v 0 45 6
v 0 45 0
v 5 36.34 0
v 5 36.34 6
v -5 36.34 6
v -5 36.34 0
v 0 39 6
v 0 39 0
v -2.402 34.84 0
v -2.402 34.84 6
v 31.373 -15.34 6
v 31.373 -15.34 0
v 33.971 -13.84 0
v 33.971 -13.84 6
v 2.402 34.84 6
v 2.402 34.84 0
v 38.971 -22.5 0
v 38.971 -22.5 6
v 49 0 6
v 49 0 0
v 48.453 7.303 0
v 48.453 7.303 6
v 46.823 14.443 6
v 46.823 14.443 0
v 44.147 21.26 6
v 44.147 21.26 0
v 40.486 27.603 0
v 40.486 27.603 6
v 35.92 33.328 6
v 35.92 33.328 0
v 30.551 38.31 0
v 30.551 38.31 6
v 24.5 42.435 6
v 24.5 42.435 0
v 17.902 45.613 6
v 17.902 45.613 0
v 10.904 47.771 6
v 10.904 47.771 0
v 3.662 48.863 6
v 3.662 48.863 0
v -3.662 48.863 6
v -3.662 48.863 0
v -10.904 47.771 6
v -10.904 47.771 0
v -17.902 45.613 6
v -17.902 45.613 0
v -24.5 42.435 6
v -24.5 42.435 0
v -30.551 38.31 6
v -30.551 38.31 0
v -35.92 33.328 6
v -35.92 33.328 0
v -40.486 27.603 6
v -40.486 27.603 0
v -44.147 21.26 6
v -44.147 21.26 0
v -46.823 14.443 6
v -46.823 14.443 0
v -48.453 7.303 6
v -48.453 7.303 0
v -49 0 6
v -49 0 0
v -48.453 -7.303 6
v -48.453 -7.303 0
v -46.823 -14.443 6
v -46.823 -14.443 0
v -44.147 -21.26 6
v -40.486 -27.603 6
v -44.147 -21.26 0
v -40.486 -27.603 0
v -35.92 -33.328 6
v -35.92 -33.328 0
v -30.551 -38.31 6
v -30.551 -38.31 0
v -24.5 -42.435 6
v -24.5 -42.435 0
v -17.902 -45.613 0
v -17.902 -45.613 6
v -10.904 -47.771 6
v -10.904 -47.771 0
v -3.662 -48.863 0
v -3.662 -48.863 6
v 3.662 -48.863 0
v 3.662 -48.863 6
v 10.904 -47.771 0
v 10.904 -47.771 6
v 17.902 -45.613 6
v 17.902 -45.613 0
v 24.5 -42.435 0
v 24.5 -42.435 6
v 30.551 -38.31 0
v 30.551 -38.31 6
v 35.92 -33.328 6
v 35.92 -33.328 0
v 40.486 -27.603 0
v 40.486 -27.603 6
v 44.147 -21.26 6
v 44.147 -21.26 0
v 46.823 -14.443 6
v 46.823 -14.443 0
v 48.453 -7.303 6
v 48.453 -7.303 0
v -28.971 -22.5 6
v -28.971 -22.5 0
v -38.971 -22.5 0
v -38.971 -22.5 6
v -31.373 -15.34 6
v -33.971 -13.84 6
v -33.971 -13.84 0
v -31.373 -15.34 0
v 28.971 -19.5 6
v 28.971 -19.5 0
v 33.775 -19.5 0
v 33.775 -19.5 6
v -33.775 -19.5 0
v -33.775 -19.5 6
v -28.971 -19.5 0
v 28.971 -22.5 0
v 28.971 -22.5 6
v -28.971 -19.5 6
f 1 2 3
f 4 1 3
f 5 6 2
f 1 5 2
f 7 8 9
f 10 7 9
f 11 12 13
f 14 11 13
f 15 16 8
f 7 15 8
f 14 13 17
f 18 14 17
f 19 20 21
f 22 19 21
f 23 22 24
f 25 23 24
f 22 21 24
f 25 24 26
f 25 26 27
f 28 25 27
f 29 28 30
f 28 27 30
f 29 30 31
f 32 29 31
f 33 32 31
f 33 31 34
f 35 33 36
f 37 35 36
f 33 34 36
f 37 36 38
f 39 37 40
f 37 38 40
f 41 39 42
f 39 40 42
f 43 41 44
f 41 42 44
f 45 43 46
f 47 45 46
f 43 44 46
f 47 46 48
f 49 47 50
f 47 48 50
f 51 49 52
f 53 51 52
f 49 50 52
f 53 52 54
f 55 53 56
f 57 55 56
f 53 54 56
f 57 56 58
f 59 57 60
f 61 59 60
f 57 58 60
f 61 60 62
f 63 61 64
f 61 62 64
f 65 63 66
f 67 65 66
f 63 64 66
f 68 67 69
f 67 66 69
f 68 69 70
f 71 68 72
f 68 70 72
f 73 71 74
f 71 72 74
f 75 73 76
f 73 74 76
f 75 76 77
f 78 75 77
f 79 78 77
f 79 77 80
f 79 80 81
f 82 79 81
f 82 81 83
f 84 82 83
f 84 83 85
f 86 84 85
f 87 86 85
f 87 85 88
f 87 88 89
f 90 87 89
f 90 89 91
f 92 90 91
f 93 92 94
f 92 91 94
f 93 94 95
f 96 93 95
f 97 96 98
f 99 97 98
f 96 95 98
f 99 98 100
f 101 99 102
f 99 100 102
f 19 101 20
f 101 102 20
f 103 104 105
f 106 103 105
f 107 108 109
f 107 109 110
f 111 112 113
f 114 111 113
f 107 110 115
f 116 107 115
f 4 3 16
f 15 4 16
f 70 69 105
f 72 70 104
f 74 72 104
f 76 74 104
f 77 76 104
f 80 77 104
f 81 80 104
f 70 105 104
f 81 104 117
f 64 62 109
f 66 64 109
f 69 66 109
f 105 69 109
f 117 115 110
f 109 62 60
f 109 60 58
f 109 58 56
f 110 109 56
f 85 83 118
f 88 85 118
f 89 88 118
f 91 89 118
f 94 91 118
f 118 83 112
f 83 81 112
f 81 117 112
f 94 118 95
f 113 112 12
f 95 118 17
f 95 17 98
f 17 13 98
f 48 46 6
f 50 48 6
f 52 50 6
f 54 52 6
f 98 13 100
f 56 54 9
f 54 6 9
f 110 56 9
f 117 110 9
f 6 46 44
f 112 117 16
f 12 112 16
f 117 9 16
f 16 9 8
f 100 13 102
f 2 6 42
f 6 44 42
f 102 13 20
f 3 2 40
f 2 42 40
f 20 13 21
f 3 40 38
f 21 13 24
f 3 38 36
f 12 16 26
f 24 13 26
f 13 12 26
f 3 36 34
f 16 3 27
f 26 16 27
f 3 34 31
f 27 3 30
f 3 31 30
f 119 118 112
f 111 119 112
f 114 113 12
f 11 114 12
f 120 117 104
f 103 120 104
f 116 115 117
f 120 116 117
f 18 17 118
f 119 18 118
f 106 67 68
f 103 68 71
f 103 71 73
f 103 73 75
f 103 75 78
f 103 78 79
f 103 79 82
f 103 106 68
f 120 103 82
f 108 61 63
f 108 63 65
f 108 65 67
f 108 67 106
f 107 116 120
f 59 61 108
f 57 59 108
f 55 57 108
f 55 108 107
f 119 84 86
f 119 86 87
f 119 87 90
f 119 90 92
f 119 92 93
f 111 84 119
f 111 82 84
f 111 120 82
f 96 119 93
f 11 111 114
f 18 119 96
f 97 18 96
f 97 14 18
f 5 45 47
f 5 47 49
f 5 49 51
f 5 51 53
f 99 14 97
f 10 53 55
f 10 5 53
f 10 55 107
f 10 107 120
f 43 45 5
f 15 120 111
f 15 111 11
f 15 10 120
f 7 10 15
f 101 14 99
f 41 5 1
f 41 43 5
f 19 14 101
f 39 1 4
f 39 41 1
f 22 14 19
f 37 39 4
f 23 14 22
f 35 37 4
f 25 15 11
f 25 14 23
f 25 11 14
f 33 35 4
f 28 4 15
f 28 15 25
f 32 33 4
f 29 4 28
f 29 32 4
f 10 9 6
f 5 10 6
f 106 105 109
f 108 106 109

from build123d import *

# Parameters (mm, degrees)
CROQUIS1_R              = 49
SALIENTE_EXTRUIR1_DEPTH = 6


with BuildPart() as part:
    # Croquis1 → Saliente-Extruir1 (new body)
    # profile 1 of 2: a face of its own
    with BuildSketch(Plane.XY):
        Circle(CROQUIS1_R)
        Polygon((-5, 36.339745962), (0, 45), (5, 36.339745962), (33.97114317, -13.839745962), (38.97114317, -22.5), (28.97114317, -22.5), (-28.97114317, -22.5), (-38.97114317, -22.5), (-33.97114317, -13.839745962), align=None, mode=Mode.SUBTRACT)
    # profile 2 of 2: a face of its own
    with BuildSketch(Plane.XY):
        Polygon((-2.401923789, 34.839745962), (-5, 36.339745962), (-33.97114317, -13.839745962), (-31.373066959, -15.339745962), (-33.774990748, -19.5), (-28.97114317, -19.5), (-28.97114317, -22.5), (28.97114317, -22.5), (28.97114317, -19.5), (33.774990748, -19.5), (31.373066959, -15.339745962), (33.97114317, -13.839745962), (5, 36.339745962), (2.401923789, 34.839745962), (0, 39), align=None)
    extrude(amount=SALIENTE_EXTRUIR1_DEPTH)


solid = part.part
